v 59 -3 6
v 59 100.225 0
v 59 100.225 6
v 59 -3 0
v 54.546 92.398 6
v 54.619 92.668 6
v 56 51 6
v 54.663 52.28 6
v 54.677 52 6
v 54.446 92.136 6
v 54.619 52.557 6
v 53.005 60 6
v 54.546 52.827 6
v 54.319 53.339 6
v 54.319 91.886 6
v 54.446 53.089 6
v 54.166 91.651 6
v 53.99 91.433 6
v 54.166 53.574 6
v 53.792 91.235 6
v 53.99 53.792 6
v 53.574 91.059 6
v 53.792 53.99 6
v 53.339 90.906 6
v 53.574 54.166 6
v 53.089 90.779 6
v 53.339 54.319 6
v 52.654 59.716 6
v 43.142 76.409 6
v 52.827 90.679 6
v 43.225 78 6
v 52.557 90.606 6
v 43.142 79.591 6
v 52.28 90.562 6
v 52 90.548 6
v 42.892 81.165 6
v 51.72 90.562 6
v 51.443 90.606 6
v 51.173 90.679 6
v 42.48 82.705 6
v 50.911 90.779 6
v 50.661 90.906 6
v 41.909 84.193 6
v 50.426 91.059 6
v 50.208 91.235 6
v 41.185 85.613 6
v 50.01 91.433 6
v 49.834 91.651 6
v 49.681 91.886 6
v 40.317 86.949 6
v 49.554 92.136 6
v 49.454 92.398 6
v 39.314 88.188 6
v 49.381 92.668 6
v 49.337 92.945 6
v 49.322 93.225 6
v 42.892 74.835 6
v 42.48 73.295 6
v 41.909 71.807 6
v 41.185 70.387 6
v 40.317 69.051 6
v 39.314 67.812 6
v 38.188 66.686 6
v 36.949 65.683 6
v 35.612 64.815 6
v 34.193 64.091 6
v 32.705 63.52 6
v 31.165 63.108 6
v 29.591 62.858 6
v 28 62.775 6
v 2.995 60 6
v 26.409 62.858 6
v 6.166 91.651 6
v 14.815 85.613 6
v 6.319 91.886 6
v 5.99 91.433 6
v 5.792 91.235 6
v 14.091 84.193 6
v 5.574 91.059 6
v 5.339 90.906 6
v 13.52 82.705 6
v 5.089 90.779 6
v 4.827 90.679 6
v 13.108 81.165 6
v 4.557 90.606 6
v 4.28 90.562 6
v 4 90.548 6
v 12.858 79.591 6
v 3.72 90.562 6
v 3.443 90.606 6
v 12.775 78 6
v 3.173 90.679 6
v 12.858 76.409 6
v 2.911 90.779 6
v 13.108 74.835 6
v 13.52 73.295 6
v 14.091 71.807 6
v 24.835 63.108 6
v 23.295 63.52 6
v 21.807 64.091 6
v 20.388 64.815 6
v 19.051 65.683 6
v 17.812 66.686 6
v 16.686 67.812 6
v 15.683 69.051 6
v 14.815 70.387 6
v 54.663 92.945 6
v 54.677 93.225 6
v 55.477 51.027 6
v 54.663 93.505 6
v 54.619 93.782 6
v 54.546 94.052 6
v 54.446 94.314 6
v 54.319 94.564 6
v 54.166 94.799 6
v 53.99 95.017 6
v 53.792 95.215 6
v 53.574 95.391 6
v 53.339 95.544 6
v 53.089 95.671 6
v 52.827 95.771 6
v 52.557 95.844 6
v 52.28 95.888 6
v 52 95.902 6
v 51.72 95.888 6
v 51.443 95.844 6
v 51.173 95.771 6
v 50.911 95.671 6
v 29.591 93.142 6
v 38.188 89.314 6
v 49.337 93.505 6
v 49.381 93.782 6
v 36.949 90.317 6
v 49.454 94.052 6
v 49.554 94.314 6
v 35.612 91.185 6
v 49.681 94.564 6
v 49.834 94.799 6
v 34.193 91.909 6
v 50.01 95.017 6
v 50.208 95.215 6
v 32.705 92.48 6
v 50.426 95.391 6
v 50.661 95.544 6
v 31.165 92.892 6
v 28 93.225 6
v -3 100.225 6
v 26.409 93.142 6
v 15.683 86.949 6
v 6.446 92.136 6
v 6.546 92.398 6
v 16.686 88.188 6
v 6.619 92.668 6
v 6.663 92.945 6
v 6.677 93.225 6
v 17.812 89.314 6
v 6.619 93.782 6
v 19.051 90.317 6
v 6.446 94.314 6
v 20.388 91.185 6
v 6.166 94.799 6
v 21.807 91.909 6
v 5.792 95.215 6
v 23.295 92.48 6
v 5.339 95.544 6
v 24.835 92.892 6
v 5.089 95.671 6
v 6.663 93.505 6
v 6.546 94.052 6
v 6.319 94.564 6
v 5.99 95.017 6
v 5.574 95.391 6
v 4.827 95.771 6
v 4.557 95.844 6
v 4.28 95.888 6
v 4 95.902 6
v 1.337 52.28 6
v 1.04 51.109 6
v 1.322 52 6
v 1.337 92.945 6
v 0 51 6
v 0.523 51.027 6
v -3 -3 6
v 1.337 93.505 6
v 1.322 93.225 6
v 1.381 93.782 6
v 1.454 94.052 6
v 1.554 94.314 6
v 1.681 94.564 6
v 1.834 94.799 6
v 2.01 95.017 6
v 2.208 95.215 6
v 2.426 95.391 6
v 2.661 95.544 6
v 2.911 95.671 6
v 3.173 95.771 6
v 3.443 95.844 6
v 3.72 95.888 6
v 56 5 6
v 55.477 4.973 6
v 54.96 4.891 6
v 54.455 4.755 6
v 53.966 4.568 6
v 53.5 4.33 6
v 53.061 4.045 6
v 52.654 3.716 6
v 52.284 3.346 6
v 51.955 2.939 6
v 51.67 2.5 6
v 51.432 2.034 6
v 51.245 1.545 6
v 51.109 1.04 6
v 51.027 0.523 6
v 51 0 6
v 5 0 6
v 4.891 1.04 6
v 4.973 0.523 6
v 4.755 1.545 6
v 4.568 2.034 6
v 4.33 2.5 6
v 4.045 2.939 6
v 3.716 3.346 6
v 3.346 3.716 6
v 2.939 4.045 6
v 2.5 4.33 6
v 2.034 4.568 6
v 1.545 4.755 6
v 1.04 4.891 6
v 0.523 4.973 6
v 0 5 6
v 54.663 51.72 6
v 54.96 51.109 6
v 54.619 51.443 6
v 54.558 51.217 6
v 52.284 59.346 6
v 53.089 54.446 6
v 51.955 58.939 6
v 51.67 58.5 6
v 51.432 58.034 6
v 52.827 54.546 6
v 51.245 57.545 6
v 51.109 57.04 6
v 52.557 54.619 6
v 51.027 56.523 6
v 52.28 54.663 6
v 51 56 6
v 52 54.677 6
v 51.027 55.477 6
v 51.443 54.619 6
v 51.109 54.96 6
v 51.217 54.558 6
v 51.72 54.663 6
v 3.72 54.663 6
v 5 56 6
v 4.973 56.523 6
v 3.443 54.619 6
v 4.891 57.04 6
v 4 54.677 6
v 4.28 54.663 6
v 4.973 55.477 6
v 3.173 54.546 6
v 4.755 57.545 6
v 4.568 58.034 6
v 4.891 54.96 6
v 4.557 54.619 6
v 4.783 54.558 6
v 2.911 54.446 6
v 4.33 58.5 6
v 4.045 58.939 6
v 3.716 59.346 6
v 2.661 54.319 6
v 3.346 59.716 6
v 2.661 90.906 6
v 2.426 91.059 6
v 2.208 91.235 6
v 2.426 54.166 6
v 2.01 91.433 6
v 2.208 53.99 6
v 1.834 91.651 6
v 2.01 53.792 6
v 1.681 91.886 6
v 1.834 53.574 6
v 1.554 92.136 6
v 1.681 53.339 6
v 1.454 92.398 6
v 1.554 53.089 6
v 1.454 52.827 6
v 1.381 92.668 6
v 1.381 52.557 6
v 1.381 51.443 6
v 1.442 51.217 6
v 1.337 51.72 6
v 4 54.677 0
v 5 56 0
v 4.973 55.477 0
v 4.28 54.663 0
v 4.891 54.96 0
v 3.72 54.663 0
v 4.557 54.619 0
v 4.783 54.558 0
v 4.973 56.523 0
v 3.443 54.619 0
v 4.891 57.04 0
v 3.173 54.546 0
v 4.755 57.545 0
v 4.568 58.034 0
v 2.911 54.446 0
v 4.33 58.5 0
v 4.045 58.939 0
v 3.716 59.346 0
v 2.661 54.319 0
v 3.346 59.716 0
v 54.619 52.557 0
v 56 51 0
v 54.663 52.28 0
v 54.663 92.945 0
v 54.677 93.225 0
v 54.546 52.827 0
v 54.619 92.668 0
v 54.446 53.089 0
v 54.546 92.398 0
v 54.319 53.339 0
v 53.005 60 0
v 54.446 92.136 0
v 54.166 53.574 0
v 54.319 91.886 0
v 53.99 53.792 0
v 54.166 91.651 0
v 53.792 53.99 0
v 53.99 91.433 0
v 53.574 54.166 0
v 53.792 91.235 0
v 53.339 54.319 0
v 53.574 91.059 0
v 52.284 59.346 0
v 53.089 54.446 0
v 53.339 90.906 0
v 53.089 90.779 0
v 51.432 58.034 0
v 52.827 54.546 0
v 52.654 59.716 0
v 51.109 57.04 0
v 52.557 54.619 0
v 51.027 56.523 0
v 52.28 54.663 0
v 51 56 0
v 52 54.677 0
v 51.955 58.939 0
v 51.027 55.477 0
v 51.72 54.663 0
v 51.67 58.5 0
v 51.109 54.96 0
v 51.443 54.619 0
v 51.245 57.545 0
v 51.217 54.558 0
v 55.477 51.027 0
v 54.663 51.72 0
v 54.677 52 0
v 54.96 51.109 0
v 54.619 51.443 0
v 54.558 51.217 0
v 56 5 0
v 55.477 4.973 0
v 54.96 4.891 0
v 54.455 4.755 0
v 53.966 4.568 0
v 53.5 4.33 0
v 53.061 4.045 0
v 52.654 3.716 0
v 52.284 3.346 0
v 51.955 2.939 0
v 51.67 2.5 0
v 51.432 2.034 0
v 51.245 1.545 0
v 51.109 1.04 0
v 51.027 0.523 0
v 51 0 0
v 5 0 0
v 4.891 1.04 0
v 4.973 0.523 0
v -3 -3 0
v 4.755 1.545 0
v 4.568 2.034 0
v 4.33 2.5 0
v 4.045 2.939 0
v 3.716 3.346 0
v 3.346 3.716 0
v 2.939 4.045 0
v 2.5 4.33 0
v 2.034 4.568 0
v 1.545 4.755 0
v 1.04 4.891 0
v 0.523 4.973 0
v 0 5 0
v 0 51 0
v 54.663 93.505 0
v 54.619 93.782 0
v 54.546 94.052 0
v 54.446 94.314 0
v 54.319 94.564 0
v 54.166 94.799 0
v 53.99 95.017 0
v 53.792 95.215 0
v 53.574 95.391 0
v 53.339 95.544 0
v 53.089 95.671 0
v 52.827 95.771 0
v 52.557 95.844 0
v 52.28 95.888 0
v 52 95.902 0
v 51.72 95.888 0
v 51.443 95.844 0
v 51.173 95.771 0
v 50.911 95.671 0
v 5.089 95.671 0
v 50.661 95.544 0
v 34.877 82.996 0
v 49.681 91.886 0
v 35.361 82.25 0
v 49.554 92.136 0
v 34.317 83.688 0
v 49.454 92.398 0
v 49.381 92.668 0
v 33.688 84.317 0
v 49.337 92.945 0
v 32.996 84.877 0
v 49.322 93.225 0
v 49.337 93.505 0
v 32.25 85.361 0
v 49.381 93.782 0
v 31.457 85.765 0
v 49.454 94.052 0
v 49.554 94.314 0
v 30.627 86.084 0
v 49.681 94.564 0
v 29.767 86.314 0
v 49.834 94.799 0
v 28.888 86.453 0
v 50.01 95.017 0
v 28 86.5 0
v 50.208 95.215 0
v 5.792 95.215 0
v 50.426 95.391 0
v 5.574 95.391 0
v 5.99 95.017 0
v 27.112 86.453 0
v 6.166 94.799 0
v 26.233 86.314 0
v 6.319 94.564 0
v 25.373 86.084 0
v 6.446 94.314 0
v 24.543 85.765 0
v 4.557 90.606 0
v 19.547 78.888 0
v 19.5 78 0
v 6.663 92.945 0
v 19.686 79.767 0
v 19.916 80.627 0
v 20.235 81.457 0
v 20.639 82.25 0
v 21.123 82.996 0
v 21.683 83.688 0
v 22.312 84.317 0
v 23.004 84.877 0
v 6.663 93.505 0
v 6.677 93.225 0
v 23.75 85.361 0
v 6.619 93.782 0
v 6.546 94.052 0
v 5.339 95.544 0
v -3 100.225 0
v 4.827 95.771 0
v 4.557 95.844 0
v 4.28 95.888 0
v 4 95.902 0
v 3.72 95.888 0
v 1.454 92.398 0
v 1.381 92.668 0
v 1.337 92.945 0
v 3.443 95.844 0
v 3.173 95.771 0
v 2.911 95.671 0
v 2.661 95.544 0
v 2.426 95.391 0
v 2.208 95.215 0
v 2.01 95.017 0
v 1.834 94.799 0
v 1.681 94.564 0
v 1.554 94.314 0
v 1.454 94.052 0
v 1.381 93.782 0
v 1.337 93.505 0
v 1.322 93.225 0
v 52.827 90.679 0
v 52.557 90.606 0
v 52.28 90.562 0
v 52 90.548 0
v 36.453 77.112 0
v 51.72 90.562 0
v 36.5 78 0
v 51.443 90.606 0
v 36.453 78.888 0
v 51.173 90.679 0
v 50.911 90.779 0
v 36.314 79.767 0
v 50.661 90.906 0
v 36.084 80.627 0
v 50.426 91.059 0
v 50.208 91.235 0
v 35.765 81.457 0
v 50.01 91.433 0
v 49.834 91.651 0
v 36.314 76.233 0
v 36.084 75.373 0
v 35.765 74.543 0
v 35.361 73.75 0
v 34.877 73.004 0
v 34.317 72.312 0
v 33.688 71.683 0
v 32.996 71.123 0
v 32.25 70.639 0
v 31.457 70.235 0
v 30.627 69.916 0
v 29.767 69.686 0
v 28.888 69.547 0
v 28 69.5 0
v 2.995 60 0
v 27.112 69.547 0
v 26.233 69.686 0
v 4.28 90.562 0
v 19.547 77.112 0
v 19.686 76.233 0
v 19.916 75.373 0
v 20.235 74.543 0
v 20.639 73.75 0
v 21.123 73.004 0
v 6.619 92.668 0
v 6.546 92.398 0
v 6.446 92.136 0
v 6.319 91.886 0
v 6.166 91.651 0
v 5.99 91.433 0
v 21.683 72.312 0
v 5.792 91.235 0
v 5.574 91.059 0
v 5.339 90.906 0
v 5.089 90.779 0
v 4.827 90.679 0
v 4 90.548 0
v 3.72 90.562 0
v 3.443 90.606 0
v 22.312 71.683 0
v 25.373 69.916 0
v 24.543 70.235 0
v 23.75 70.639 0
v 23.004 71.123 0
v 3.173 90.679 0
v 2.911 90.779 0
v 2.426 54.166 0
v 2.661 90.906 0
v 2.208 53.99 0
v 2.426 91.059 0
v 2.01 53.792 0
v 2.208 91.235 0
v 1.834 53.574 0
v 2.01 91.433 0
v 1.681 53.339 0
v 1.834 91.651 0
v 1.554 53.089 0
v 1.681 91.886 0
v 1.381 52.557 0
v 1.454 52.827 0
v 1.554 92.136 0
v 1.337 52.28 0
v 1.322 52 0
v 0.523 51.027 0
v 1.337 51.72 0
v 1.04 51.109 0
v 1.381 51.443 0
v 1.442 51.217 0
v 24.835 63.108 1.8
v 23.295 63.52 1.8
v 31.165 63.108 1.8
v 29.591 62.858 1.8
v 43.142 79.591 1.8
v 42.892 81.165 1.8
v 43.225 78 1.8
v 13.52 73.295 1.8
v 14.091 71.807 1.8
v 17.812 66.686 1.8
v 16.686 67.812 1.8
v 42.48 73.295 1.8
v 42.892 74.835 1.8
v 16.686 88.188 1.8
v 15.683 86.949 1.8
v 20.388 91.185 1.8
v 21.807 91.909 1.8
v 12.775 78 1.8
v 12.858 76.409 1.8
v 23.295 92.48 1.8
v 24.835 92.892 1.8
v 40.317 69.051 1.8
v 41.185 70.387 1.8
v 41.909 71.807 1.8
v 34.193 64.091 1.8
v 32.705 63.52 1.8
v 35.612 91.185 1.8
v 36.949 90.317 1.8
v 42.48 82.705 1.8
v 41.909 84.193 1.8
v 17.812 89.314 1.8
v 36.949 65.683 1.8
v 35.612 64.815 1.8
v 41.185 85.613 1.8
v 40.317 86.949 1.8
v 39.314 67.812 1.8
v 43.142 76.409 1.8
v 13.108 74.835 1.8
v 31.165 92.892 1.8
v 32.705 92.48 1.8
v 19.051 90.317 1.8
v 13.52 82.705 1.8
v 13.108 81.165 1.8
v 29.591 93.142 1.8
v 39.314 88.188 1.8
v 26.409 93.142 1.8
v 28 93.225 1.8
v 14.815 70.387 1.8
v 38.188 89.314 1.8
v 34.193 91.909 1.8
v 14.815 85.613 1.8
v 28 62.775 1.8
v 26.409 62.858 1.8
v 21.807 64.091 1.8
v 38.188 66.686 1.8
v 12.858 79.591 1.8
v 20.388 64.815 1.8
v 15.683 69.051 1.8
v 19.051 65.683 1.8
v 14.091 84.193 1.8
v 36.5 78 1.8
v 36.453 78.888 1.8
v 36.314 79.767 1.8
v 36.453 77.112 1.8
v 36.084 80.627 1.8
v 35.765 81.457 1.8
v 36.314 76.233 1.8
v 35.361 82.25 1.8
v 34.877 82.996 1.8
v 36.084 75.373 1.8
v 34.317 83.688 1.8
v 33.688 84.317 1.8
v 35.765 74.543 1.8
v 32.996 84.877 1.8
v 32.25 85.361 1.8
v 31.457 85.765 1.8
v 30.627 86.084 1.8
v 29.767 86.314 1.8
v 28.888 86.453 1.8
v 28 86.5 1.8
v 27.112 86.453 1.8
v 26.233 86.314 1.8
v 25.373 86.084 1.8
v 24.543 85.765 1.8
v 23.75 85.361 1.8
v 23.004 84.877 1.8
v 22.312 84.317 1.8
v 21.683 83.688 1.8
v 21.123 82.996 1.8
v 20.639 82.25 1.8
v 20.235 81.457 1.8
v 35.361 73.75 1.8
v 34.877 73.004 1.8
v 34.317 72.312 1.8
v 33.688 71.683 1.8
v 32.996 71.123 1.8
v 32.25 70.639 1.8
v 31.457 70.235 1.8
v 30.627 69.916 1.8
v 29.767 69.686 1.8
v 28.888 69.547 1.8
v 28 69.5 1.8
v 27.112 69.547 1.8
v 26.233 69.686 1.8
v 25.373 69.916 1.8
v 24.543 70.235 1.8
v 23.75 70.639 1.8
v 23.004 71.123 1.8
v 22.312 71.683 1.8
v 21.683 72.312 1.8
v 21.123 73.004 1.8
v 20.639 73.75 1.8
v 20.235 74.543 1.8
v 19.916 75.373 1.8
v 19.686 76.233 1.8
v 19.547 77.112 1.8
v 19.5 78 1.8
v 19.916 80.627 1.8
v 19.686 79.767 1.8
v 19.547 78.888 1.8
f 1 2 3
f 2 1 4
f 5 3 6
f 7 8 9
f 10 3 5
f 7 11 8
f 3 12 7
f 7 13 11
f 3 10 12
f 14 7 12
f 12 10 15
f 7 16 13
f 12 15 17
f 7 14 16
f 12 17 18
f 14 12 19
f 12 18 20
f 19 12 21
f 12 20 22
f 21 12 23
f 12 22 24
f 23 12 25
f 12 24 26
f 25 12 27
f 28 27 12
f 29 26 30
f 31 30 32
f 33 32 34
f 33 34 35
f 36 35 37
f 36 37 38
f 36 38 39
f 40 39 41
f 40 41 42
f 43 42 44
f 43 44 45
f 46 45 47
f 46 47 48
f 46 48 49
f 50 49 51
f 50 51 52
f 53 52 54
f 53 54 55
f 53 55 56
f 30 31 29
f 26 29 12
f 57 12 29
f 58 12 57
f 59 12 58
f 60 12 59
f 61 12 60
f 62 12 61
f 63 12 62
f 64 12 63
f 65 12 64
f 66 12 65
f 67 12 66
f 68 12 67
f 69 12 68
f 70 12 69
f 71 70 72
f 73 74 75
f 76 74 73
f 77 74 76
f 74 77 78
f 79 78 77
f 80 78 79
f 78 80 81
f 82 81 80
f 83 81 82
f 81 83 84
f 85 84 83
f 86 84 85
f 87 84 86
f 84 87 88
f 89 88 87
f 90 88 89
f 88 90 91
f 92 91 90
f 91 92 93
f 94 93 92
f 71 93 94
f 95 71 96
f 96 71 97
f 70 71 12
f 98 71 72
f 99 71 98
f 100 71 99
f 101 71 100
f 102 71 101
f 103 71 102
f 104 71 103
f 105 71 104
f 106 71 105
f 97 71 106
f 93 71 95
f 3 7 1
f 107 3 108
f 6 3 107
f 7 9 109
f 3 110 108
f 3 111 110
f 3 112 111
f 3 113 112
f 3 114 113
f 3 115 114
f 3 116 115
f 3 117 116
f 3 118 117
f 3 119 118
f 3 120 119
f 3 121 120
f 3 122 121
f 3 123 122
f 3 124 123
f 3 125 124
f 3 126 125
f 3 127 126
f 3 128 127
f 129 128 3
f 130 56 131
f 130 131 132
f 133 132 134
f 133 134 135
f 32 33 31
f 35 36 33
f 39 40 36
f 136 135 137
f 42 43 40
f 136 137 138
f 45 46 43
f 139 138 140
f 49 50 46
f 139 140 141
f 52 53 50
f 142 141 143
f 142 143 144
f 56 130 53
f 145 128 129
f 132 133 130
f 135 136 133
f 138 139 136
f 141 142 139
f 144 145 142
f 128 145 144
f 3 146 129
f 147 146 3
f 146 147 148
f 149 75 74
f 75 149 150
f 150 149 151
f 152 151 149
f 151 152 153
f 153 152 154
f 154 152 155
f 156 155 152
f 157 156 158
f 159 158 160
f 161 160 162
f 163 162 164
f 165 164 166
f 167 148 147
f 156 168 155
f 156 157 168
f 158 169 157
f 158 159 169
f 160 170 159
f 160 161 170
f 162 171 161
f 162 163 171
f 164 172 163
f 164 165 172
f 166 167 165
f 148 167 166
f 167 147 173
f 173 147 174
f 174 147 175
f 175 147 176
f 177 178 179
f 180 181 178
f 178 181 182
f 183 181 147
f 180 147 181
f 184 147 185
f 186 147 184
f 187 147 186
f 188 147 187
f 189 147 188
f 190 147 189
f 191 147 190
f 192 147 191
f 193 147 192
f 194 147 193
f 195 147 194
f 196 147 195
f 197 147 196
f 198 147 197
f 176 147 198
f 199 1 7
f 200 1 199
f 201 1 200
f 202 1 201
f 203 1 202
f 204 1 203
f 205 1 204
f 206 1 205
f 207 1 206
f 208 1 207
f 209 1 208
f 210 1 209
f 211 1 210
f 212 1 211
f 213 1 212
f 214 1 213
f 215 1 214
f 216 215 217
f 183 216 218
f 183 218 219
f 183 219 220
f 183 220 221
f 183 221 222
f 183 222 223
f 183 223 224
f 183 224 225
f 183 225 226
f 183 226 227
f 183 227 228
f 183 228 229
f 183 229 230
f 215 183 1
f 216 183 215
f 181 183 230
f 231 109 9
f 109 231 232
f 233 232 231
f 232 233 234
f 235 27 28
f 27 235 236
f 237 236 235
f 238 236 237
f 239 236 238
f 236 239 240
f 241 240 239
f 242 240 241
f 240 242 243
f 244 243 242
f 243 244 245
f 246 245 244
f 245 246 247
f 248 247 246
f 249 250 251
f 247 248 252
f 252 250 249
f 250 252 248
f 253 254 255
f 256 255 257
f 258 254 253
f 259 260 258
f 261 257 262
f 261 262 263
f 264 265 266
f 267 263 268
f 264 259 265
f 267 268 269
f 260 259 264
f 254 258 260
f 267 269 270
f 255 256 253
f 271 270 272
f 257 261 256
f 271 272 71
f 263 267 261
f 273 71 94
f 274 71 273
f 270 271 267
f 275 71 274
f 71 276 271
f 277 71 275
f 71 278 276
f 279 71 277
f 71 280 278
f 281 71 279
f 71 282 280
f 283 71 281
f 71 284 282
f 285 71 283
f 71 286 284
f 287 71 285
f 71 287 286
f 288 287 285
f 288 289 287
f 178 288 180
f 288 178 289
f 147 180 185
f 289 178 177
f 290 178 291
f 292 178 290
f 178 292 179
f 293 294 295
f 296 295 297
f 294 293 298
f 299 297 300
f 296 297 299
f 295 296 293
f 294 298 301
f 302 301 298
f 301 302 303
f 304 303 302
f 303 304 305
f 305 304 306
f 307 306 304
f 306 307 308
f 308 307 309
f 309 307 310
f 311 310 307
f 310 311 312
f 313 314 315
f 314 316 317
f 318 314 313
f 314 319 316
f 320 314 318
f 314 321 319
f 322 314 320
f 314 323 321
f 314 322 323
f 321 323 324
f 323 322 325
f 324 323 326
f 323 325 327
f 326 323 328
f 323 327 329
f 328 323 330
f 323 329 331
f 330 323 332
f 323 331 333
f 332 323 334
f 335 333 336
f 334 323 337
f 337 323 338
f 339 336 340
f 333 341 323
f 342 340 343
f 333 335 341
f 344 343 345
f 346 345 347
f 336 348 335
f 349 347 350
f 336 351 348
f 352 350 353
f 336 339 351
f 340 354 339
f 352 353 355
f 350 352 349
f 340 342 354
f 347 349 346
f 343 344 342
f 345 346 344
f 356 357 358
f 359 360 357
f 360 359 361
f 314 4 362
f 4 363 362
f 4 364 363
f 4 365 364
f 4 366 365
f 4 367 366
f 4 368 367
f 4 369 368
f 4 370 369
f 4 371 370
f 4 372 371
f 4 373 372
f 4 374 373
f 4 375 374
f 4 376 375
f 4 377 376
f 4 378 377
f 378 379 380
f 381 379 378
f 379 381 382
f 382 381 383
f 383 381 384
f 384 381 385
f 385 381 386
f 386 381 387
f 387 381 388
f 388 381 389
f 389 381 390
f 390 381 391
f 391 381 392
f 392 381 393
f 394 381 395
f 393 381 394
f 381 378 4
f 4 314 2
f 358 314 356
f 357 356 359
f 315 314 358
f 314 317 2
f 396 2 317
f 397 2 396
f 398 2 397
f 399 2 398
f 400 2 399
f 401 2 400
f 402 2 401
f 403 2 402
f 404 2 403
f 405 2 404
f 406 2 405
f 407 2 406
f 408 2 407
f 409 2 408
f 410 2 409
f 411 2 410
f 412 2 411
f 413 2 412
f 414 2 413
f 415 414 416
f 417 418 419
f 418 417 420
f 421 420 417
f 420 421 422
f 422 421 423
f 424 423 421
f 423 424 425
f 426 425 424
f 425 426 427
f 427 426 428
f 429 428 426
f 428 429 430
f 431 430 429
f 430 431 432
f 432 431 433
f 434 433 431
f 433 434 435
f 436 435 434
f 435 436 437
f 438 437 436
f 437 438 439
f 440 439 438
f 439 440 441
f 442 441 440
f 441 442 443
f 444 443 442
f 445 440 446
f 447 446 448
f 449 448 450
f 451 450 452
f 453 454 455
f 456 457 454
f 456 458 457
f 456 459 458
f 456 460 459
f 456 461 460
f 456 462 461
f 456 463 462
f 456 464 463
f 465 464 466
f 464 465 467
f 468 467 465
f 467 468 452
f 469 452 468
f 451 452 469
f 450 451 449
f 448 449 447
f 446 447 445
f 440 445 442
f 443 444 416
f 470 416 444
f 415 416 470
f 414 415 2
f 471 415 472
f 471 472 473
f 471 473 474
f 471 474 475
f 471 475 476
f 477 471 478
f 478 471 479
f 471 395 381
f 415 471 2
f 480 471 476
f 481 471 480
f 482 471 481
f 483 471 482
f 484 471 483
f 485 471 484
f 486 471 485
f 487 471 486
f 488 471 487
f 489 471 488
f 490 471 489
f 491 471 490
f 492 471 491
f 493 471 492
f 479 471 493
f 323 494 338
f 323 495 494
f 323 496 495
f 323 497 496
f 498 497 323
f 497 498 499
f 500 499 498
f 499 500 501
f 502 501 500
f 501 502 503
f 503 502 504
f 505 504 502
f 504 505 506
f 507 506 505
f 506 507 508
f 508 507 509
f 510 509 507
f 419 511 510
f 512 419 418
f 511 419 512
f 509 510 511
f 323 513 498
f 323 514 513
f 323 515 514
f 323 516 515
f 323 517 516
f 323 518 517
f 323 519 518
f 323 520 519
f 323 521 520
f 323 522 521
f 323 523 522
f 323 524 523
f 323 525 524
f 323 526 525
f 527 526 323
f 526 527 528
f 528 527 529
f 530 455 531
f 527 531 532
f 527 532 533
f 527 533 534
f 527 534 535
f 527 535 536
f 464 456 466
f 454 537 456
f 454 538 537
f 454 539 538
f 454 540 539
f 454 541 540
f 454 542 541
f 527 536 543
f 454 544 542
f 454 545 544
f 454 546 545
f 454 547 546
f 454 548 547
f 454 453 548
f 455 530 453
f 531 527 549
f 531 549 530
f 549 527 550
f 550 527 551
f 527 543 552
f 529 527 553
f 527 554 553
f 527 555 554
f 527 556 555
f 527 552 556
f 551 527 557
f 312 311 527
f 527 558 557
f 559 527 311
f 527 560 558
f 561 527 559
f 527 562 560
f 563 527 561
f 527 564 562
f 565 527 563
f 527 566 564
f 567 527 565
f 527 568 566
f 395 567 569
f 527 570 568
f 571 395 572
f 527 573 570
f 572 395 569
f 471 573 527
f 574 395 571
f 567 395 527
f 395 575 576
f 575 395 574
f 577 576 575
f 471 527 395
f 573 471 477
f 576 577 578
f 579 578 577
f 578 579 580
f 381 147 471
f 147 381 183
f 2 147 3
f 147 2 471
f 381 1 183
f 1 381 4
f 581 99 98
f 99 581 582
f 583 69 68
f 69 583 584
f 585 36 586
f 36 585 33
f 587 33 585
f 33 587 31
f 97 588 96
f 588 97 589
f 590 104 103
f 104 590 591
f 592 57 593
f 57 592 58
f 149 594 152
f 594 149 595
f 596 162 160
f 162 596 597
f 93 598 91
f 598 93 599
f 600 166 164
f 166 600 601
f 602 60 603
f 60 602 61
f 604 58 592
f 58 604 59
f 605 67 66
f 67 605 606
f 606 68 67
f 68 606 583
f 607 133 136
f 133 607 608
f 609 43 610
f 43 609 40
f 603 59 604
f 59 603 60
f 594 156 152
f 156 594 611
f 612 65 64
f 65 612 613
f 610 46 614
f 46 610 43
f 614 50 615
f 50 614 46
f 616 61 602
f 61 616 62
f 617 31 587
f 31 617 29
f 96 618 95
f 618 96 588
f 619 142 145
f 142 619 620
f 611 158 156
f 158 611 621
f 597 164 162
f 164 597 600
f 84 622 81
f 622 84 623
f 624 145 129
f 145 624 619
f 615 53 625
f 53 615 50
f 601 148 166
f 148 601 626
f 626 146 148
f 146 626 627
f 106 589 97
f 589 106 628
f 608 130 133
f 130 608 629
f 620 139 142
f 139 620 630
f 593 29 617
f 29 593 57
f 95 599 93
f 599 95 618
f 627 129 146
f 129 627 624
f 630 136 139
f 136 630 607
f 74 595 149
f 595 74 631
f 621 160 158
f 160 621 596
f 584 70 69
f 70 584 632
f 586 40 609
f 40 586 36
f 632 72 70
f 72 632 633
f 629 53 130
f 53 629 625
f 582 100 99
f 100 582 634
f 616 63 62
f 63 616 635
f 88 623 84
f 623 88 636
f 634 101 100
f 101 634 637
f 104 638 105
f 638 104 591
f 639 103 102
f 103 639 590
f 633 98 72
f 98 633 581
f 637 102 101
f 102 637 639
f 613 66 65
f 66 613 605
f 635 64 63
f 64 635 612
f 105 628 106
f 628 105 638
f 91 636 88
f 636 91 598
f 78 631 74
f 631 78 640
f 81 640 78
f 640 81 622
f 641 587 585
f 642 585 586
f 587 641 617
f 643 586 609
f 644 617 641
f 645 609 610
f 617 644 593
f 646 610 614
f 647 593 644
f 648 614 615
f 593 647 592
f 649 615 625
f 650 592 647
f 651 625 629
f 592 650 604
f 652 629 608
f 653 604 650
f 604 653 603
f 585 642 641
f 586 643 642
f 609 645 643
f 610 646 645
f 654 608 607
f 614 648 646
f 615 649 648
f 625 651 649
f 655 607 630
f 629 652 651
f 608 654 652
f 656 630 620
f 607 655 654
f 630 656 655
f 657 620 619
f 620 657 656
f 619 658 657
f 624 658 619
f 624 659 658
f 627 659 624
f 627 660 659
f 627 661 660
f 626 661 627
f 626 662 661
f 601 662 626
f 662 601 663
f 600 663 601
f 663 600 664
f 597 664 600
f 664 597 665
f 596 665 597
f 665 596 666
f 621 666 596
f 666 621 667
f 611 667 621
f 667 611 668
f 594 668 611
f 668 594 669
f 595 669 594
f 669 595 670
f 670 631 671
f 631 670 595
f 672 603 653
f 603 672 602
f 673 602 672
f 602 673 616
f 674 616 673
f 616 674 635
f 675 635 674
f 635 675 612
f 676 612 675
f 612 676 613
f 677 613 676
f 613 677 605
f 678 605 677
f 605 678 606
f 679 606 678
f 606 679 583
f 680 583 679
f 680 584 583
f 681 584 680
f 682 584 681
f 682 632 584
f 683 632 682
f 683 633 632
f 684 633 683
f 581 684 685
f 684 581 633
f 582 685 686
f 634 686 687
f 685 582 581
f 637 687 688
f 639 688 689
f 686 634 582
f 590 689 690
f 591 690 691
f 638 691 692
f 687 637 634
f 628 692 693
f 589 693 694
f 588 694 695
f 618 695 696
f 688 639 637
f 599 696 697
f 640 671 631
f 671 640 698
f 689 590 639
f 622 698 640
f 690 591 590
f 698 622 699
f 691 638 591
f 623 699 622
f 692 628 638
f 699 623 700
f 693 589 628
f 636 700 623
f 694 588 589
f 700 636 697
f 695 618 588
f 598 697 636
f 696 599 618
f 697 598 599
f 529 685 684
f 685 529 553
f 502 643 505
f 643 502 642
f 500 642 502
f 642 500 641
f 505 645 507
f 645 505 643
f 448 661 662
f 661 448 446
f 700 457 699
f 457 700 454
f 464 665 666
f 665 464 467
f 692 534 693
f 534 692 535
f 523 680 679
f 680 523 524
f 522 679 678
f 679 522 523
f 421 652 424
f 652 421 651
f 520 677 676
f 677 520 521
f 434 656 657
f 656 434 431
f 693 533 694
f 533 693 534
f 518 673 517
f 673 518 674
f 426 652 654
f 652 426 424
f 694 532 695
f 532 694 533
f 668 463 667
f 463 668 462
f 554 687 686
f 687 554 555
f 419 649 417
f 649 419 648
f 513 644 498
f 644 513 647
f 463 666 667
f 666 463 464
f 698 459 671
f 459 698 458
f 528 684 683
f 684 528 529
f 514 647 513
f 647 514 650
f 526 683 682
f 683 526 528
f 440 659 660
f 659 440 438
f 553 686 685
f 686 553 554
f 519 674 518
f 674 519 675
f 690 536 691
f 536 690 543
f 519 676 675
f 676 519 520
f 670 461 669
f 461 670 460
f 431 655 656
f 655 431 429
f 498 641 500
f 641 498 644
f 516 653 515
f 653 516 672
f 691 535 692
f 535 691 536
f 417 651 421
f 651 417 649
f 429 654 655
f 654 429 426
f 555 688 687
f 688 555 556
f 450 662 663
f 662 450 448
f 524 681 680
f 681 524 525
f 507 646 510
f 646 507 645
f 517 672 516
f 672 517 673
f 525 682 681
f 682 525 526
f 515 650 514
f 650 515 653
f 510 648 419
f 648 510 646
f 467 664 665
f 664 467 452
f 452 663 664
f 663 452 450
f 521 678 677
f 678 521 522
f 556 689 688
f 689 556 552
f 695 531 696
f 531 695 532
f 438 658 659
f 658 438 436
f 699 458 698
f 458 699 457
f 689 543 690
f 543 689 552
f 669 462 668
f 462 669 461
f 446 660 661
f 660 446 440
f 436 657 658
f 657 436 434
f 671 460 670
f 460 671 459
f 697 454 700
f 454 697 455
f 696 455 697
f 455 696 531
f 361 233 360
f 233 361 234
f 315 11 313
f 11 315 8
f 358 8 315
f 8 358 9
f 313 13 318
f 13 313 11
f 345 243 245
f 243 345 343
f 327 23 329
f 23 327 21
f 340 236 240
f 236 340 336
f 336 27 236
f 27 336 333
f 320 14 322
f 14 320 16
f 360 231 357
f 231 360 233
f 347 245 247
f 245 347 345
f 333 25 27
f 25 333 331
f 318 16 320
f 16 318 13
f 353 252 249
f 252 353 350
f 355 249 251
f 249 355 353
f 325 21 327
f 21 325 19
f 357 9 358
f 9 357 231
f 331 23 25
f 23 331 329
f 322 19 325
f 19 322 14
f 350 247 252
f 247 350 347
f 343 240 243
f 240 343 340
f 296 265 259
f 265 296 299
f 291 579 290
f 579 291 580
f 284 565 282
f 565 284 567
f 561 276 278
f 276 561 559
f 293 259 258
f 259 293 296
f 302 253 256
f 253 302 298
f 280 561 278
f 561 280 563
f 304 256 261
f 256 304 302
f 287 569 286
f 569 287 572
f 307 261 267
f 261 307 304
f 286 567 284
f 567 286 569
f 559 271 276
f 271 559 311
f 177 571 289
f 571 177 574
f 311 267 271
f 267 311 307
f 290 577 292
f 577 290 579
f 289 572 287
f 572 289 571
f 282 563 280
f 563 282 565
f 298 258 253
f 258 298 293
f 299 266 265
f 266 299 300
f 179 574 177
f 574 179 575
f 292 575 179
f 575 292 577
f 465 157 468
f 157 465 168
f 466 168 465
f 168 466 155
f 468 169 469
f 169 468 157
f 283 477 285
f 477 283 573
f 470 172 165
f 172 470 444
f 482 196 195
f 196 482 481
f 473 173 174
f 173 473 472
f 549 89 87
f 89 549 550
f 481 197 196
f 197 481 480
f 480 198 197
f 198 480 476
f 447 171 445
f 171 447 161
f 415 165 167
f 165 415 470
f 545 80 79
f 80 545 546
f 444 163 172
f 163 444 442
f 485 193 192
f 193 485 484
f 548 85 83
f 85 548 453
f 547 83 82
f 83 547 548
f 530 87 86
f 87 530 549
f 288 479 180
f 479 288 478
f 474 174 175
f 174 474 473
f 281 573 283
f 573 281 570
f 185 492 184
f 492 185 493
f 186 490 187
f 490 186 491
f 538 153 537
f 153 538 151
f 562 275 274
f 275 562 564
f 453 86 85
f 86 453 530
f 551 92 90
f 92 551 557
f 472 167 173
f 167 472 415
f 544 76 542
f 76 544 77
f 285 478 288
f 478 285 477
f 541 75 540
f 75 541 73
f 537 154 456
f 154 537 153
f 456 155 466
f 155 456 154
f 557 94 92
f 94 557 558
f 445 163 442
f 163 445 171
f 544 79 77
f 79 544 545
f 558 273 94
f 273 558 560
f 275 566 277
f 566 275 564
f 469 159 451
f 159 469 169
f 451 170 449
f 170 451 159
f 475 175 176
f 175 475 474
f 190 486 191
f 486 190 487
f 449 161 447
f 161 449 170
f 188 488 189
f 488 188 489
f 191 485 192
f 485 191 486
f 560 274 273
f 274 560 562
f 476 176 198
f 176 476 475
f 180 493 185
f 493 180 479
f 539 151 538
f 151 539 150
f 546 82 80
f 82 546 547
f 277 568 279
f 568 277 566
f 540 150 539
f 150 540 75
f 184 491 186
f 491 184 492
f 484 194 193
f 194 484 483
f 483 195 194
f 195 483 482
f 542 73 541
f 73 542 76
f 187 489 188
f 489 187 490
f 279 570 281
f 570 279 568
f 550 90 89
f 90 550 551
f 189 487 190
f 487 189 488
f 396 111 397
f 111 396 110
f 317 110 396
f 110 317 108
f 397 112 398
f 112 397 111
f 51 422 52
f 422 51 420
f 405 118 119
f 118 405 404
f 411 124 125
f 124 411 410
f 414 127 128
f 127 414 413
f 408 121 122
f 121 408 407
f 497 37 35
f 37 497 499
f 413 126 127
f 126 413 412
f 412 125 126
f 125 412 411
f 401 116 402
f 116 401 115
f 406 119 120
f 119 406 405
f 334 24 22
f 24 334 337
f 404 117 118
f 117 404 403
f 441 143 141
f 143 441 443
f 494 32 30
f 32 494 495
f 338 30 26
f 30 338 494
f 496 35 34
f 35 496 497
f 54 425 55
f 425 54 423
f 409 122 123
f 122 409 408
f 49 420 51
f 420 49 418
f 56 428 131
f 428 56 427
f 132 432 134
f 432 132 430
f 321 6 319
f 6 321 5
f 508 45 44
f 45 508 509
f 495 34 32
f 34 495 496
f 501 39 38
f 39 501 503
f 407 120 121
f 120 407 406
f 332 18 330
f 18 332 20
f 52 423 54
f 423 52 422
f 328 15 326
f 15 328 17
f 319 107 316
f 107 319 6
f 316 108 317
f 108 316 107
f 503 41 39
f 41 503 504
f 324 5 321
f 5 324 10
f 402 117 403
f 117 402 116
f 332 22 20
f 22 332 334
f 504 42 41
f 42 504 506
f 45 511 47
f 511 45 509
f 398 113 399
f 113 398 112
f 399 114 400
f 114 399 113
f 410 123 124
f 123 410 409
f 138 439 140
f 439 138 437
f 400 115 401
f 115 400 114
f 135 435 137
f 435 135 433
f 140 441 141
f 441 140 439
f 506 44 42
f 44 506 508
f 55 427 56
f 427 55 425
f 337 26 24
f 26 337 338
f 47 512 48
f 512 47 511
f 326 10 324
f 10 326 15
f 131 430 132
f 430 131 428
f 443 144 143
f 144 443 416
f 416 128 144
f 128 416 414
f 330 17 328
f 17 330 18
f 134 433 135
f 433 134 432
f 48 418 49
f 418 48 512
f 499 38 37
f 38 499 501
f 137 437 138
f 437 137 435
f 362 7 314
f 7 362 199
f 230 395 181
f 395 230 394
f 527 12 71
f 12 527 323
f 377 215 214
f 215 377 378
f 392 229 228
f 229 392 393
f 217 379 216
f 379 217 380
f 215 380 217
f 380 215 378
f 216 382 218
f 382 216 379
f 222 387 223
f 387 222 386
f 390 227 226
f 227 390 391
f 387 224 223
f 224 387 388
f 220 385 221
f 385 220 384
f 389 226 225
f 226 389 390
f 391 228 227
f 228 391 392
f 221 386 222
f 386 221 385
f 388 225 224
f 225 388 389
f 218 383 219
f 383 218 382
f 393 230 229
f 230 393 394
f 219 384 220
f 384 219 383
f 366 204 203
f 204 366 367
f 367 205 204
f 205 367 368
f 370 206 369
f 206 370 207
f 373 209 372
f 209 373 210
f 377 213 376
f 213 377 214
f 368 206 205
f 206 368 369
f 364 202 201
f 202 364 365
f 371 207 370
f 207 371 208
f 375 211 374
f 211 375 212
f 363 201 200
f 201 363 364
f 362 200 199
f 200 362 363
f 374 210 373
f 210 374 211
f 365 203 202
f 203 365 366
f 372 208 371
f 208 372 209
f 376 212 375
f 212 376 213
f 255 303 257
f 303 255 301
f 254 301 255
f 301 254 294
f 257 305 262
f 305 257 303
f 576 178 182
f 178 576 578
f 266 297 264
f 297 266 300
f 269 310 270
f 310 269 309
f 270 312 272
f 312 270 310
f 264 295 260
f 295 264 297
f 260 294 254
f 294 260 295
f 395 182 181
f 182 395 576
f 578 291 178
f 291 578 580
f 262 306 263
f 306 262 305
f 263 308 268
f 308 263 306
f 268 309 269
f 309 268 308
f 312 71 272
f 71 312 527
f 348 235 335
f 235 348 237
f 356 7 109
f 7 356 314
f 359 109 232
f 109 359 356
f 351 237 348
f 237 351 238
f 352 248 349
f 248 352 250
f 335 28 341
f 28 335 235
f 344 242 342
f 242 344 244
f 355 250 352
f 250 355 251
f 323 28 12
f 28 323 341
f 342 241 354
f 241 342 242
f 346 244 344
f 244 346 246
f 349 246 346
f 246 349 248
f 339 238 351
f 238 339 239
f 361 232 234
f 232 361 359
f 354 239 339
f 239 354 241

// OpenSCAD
$fn = 60;
large_fn = 90;
tolerance = 1.05;
height = 12;
bearing_height = 8 * tolerance;
axle_distance = 50;
stepper_size = 56;
stepper_center = 40;
bearing_OD = 29 * tolerance;
bearing_ID = 17;
hole_ID = 5.1 * tolerance;
hole_offset = 4;
stepper_tab_depth = 5;
motor_surround = 3;

length = stepper_size / 2 + bearing_OD / 2 + 
            axle_distance + hole_offset;

module hexagon(size, height) {
  boxWidth = size/1.75;
  for (r = [-60, 0, 60]) rotate([0,0,r]) cube([boxWidth, size, height], true);
}


stepper_length = 100 - stepper_tab_depth;

nut_depth = 5 * tolerance;
nut_width = 8 * tolerance;
connector_width = 10;
wall_thickness = (connector_width - nut_width) / 2;
screw_length = 35;
nut_hole_depth = screw_length - nut_width - height - stepper_tab_depth;
connector_plate_depth = 3;
connector_sep = stepper_size - 2 * hole_offset - connector_width;
wire_height = 4;
gap = 3;

module end_hole() {
    
}

module connector() {
    difference() {
        union() {
            translate([connector_width / 2, 0, connector_width / 2])
            rotate([-90])
                cylinder(stepper_length, connector_width / 2,  
        connector_width / 2);
            cube([connector_width, stepper_length, connector_width / 2]);
            cube([connector_width / 2, stepper_length, connector_width]);
        }
        
        translate([connector_width / 2, 0, connector_width / 2])
            rotate([-90])
                cylinder(nut_hole_depth + nut_depth + nut_depth, hole_ID / 2, hole_ID / 2);
        translate([connector_width / 2, stepper_length, connector_width / 2])
            rotate([90])
                cylinder(nut_hole_depth + nut_depth + nut_depth, hole_ID / 2, hole_ID / 2);
        
        translate([connector_width / 2, nut_hole_depth + nut_depth / 2, connector_width / 2])
            rotate([90, 30]) hexagon(nut_width, nut_depth);
        translate([wall_thickness, nut_hole_depth, connector_width / 2])
            cube([nut_width, nut_depth, connector_width / 2]);
        
        translate([connector_width / 2, stepper_length - nut_hole_depth - nut_depth / 2, connector_width / 2])
            rotate([90, 30]) 
                hexagon(nut_width, nut_depth);
        translate([wall_thickness, stepper_length - nut_hole_depth - nut_depth, connector_width / 2])
            cube([nut_width, nut_depth, connector_width / 2]);        
   }
    
}     

module bearing_plate() {
    difference() {
        translate([-motor_surround, -motor_surround, 0])
            cube([stepper_size + 2 * motor_surround, 
            length + 2 * motor_surround, height / 2]);
        translate([stepper_size/2, stepper_size/2+axle_distance,
                (height - bearing_height) / 2]) 
            cylinder(height, bearing_OD/2, bearing_OD/2);
        
        translate([stepper_size/2, stepper_size/2+axle_distance]) 
            cylinder(height, bearing_ID/2, bearing_ID/2);
    }
}

module half_holy_plate() {
    difference() {
        bearing_plate();
    
        translate([stepper_size-hole_offset, stepper_size - hole_offset]) 
            cylinder(height, hole_ID / 2, hole_ID / 2);
        translate([hole_offset, stepper_size - hole_offset]) 
            cylinder(height, hole_ID / 2, hole_ID / 2);
        translate([hole_offset, 
                    length - hole_offset]) 
            cylinder(height, hole_ID / 2, hole_ID / 2);
        translate([stepper_size - hole_offset, 
                    length - hole_offset]) 
            cylinder(height, hole_ID / 2, hole_ID / 2);
    }
}

module holy_plate() {
    difference() {
        half_holy_plate();
        translate([hole_offset, hole_offset]) 
            cylinder(height, hole_ID / 2, hole_ID / 2);
        translate([stepper_size - hole_offset, hole_offset]) 
            cylinder(height, hole_ID / 2, hole_ID / 2);
    }
}


module mount_plate() {

    difference() {
        holy_plate();
        translate([stepper_size / 2, stepper_size / 2]) 
            cylinder(height, stepper_center / 2, stepper_center / 2);
    }
}

module backing_plate() {
    difference() {
        half_holy_plate();
        difference() {
            cube([stepper_size, stepper_size + wire_height, height / 2]);
            cylinder(height, connector_width / 2, connector_width / 2);
            translate([stepper_size, 0])
                cylinder(height, connector_width / 2, connector_width / 2);
            translate([0, stepper_size])
                cylinder(height, connector_width / 2, connector_width / 2);
            translate([stepper_size, stepper_size])
                cylinder(height, connector_width / 2, connector_width / 2);
            
        }        
    }
}

//mount_plate(); 
//translate([stepper_size + gap + 3 * motor_surround, 0]) 
backing_plate();
//translate([0, length + gap + 3 * motor_surround]) mount_plate(); 
//translate([stepper_size + gap + 3 * motor_surround, length + gap + 3 * motor_surround]) backing_plate();
/*
translate([stepper_size + gap, length + gap]) mount_plate();
translate([0, length + gap]) mount_plate(); // */

//translate([-connector_width - gap, 0]) connector();
/*translate([-connector_width - gap, length + gap]) connector();
translate([2 * (-connector_width - gap), 0]) connector();
translate([2 * (-connector_width - gap), length + gap]) connector();

/*
translate([0, -height])
    linear_extrude(stepper_size)
    square([stepper_size, height]);

translate([-height, -height])
    linear_extrude(stepper_size)
    square([height, stepper_size + height]);
*/
